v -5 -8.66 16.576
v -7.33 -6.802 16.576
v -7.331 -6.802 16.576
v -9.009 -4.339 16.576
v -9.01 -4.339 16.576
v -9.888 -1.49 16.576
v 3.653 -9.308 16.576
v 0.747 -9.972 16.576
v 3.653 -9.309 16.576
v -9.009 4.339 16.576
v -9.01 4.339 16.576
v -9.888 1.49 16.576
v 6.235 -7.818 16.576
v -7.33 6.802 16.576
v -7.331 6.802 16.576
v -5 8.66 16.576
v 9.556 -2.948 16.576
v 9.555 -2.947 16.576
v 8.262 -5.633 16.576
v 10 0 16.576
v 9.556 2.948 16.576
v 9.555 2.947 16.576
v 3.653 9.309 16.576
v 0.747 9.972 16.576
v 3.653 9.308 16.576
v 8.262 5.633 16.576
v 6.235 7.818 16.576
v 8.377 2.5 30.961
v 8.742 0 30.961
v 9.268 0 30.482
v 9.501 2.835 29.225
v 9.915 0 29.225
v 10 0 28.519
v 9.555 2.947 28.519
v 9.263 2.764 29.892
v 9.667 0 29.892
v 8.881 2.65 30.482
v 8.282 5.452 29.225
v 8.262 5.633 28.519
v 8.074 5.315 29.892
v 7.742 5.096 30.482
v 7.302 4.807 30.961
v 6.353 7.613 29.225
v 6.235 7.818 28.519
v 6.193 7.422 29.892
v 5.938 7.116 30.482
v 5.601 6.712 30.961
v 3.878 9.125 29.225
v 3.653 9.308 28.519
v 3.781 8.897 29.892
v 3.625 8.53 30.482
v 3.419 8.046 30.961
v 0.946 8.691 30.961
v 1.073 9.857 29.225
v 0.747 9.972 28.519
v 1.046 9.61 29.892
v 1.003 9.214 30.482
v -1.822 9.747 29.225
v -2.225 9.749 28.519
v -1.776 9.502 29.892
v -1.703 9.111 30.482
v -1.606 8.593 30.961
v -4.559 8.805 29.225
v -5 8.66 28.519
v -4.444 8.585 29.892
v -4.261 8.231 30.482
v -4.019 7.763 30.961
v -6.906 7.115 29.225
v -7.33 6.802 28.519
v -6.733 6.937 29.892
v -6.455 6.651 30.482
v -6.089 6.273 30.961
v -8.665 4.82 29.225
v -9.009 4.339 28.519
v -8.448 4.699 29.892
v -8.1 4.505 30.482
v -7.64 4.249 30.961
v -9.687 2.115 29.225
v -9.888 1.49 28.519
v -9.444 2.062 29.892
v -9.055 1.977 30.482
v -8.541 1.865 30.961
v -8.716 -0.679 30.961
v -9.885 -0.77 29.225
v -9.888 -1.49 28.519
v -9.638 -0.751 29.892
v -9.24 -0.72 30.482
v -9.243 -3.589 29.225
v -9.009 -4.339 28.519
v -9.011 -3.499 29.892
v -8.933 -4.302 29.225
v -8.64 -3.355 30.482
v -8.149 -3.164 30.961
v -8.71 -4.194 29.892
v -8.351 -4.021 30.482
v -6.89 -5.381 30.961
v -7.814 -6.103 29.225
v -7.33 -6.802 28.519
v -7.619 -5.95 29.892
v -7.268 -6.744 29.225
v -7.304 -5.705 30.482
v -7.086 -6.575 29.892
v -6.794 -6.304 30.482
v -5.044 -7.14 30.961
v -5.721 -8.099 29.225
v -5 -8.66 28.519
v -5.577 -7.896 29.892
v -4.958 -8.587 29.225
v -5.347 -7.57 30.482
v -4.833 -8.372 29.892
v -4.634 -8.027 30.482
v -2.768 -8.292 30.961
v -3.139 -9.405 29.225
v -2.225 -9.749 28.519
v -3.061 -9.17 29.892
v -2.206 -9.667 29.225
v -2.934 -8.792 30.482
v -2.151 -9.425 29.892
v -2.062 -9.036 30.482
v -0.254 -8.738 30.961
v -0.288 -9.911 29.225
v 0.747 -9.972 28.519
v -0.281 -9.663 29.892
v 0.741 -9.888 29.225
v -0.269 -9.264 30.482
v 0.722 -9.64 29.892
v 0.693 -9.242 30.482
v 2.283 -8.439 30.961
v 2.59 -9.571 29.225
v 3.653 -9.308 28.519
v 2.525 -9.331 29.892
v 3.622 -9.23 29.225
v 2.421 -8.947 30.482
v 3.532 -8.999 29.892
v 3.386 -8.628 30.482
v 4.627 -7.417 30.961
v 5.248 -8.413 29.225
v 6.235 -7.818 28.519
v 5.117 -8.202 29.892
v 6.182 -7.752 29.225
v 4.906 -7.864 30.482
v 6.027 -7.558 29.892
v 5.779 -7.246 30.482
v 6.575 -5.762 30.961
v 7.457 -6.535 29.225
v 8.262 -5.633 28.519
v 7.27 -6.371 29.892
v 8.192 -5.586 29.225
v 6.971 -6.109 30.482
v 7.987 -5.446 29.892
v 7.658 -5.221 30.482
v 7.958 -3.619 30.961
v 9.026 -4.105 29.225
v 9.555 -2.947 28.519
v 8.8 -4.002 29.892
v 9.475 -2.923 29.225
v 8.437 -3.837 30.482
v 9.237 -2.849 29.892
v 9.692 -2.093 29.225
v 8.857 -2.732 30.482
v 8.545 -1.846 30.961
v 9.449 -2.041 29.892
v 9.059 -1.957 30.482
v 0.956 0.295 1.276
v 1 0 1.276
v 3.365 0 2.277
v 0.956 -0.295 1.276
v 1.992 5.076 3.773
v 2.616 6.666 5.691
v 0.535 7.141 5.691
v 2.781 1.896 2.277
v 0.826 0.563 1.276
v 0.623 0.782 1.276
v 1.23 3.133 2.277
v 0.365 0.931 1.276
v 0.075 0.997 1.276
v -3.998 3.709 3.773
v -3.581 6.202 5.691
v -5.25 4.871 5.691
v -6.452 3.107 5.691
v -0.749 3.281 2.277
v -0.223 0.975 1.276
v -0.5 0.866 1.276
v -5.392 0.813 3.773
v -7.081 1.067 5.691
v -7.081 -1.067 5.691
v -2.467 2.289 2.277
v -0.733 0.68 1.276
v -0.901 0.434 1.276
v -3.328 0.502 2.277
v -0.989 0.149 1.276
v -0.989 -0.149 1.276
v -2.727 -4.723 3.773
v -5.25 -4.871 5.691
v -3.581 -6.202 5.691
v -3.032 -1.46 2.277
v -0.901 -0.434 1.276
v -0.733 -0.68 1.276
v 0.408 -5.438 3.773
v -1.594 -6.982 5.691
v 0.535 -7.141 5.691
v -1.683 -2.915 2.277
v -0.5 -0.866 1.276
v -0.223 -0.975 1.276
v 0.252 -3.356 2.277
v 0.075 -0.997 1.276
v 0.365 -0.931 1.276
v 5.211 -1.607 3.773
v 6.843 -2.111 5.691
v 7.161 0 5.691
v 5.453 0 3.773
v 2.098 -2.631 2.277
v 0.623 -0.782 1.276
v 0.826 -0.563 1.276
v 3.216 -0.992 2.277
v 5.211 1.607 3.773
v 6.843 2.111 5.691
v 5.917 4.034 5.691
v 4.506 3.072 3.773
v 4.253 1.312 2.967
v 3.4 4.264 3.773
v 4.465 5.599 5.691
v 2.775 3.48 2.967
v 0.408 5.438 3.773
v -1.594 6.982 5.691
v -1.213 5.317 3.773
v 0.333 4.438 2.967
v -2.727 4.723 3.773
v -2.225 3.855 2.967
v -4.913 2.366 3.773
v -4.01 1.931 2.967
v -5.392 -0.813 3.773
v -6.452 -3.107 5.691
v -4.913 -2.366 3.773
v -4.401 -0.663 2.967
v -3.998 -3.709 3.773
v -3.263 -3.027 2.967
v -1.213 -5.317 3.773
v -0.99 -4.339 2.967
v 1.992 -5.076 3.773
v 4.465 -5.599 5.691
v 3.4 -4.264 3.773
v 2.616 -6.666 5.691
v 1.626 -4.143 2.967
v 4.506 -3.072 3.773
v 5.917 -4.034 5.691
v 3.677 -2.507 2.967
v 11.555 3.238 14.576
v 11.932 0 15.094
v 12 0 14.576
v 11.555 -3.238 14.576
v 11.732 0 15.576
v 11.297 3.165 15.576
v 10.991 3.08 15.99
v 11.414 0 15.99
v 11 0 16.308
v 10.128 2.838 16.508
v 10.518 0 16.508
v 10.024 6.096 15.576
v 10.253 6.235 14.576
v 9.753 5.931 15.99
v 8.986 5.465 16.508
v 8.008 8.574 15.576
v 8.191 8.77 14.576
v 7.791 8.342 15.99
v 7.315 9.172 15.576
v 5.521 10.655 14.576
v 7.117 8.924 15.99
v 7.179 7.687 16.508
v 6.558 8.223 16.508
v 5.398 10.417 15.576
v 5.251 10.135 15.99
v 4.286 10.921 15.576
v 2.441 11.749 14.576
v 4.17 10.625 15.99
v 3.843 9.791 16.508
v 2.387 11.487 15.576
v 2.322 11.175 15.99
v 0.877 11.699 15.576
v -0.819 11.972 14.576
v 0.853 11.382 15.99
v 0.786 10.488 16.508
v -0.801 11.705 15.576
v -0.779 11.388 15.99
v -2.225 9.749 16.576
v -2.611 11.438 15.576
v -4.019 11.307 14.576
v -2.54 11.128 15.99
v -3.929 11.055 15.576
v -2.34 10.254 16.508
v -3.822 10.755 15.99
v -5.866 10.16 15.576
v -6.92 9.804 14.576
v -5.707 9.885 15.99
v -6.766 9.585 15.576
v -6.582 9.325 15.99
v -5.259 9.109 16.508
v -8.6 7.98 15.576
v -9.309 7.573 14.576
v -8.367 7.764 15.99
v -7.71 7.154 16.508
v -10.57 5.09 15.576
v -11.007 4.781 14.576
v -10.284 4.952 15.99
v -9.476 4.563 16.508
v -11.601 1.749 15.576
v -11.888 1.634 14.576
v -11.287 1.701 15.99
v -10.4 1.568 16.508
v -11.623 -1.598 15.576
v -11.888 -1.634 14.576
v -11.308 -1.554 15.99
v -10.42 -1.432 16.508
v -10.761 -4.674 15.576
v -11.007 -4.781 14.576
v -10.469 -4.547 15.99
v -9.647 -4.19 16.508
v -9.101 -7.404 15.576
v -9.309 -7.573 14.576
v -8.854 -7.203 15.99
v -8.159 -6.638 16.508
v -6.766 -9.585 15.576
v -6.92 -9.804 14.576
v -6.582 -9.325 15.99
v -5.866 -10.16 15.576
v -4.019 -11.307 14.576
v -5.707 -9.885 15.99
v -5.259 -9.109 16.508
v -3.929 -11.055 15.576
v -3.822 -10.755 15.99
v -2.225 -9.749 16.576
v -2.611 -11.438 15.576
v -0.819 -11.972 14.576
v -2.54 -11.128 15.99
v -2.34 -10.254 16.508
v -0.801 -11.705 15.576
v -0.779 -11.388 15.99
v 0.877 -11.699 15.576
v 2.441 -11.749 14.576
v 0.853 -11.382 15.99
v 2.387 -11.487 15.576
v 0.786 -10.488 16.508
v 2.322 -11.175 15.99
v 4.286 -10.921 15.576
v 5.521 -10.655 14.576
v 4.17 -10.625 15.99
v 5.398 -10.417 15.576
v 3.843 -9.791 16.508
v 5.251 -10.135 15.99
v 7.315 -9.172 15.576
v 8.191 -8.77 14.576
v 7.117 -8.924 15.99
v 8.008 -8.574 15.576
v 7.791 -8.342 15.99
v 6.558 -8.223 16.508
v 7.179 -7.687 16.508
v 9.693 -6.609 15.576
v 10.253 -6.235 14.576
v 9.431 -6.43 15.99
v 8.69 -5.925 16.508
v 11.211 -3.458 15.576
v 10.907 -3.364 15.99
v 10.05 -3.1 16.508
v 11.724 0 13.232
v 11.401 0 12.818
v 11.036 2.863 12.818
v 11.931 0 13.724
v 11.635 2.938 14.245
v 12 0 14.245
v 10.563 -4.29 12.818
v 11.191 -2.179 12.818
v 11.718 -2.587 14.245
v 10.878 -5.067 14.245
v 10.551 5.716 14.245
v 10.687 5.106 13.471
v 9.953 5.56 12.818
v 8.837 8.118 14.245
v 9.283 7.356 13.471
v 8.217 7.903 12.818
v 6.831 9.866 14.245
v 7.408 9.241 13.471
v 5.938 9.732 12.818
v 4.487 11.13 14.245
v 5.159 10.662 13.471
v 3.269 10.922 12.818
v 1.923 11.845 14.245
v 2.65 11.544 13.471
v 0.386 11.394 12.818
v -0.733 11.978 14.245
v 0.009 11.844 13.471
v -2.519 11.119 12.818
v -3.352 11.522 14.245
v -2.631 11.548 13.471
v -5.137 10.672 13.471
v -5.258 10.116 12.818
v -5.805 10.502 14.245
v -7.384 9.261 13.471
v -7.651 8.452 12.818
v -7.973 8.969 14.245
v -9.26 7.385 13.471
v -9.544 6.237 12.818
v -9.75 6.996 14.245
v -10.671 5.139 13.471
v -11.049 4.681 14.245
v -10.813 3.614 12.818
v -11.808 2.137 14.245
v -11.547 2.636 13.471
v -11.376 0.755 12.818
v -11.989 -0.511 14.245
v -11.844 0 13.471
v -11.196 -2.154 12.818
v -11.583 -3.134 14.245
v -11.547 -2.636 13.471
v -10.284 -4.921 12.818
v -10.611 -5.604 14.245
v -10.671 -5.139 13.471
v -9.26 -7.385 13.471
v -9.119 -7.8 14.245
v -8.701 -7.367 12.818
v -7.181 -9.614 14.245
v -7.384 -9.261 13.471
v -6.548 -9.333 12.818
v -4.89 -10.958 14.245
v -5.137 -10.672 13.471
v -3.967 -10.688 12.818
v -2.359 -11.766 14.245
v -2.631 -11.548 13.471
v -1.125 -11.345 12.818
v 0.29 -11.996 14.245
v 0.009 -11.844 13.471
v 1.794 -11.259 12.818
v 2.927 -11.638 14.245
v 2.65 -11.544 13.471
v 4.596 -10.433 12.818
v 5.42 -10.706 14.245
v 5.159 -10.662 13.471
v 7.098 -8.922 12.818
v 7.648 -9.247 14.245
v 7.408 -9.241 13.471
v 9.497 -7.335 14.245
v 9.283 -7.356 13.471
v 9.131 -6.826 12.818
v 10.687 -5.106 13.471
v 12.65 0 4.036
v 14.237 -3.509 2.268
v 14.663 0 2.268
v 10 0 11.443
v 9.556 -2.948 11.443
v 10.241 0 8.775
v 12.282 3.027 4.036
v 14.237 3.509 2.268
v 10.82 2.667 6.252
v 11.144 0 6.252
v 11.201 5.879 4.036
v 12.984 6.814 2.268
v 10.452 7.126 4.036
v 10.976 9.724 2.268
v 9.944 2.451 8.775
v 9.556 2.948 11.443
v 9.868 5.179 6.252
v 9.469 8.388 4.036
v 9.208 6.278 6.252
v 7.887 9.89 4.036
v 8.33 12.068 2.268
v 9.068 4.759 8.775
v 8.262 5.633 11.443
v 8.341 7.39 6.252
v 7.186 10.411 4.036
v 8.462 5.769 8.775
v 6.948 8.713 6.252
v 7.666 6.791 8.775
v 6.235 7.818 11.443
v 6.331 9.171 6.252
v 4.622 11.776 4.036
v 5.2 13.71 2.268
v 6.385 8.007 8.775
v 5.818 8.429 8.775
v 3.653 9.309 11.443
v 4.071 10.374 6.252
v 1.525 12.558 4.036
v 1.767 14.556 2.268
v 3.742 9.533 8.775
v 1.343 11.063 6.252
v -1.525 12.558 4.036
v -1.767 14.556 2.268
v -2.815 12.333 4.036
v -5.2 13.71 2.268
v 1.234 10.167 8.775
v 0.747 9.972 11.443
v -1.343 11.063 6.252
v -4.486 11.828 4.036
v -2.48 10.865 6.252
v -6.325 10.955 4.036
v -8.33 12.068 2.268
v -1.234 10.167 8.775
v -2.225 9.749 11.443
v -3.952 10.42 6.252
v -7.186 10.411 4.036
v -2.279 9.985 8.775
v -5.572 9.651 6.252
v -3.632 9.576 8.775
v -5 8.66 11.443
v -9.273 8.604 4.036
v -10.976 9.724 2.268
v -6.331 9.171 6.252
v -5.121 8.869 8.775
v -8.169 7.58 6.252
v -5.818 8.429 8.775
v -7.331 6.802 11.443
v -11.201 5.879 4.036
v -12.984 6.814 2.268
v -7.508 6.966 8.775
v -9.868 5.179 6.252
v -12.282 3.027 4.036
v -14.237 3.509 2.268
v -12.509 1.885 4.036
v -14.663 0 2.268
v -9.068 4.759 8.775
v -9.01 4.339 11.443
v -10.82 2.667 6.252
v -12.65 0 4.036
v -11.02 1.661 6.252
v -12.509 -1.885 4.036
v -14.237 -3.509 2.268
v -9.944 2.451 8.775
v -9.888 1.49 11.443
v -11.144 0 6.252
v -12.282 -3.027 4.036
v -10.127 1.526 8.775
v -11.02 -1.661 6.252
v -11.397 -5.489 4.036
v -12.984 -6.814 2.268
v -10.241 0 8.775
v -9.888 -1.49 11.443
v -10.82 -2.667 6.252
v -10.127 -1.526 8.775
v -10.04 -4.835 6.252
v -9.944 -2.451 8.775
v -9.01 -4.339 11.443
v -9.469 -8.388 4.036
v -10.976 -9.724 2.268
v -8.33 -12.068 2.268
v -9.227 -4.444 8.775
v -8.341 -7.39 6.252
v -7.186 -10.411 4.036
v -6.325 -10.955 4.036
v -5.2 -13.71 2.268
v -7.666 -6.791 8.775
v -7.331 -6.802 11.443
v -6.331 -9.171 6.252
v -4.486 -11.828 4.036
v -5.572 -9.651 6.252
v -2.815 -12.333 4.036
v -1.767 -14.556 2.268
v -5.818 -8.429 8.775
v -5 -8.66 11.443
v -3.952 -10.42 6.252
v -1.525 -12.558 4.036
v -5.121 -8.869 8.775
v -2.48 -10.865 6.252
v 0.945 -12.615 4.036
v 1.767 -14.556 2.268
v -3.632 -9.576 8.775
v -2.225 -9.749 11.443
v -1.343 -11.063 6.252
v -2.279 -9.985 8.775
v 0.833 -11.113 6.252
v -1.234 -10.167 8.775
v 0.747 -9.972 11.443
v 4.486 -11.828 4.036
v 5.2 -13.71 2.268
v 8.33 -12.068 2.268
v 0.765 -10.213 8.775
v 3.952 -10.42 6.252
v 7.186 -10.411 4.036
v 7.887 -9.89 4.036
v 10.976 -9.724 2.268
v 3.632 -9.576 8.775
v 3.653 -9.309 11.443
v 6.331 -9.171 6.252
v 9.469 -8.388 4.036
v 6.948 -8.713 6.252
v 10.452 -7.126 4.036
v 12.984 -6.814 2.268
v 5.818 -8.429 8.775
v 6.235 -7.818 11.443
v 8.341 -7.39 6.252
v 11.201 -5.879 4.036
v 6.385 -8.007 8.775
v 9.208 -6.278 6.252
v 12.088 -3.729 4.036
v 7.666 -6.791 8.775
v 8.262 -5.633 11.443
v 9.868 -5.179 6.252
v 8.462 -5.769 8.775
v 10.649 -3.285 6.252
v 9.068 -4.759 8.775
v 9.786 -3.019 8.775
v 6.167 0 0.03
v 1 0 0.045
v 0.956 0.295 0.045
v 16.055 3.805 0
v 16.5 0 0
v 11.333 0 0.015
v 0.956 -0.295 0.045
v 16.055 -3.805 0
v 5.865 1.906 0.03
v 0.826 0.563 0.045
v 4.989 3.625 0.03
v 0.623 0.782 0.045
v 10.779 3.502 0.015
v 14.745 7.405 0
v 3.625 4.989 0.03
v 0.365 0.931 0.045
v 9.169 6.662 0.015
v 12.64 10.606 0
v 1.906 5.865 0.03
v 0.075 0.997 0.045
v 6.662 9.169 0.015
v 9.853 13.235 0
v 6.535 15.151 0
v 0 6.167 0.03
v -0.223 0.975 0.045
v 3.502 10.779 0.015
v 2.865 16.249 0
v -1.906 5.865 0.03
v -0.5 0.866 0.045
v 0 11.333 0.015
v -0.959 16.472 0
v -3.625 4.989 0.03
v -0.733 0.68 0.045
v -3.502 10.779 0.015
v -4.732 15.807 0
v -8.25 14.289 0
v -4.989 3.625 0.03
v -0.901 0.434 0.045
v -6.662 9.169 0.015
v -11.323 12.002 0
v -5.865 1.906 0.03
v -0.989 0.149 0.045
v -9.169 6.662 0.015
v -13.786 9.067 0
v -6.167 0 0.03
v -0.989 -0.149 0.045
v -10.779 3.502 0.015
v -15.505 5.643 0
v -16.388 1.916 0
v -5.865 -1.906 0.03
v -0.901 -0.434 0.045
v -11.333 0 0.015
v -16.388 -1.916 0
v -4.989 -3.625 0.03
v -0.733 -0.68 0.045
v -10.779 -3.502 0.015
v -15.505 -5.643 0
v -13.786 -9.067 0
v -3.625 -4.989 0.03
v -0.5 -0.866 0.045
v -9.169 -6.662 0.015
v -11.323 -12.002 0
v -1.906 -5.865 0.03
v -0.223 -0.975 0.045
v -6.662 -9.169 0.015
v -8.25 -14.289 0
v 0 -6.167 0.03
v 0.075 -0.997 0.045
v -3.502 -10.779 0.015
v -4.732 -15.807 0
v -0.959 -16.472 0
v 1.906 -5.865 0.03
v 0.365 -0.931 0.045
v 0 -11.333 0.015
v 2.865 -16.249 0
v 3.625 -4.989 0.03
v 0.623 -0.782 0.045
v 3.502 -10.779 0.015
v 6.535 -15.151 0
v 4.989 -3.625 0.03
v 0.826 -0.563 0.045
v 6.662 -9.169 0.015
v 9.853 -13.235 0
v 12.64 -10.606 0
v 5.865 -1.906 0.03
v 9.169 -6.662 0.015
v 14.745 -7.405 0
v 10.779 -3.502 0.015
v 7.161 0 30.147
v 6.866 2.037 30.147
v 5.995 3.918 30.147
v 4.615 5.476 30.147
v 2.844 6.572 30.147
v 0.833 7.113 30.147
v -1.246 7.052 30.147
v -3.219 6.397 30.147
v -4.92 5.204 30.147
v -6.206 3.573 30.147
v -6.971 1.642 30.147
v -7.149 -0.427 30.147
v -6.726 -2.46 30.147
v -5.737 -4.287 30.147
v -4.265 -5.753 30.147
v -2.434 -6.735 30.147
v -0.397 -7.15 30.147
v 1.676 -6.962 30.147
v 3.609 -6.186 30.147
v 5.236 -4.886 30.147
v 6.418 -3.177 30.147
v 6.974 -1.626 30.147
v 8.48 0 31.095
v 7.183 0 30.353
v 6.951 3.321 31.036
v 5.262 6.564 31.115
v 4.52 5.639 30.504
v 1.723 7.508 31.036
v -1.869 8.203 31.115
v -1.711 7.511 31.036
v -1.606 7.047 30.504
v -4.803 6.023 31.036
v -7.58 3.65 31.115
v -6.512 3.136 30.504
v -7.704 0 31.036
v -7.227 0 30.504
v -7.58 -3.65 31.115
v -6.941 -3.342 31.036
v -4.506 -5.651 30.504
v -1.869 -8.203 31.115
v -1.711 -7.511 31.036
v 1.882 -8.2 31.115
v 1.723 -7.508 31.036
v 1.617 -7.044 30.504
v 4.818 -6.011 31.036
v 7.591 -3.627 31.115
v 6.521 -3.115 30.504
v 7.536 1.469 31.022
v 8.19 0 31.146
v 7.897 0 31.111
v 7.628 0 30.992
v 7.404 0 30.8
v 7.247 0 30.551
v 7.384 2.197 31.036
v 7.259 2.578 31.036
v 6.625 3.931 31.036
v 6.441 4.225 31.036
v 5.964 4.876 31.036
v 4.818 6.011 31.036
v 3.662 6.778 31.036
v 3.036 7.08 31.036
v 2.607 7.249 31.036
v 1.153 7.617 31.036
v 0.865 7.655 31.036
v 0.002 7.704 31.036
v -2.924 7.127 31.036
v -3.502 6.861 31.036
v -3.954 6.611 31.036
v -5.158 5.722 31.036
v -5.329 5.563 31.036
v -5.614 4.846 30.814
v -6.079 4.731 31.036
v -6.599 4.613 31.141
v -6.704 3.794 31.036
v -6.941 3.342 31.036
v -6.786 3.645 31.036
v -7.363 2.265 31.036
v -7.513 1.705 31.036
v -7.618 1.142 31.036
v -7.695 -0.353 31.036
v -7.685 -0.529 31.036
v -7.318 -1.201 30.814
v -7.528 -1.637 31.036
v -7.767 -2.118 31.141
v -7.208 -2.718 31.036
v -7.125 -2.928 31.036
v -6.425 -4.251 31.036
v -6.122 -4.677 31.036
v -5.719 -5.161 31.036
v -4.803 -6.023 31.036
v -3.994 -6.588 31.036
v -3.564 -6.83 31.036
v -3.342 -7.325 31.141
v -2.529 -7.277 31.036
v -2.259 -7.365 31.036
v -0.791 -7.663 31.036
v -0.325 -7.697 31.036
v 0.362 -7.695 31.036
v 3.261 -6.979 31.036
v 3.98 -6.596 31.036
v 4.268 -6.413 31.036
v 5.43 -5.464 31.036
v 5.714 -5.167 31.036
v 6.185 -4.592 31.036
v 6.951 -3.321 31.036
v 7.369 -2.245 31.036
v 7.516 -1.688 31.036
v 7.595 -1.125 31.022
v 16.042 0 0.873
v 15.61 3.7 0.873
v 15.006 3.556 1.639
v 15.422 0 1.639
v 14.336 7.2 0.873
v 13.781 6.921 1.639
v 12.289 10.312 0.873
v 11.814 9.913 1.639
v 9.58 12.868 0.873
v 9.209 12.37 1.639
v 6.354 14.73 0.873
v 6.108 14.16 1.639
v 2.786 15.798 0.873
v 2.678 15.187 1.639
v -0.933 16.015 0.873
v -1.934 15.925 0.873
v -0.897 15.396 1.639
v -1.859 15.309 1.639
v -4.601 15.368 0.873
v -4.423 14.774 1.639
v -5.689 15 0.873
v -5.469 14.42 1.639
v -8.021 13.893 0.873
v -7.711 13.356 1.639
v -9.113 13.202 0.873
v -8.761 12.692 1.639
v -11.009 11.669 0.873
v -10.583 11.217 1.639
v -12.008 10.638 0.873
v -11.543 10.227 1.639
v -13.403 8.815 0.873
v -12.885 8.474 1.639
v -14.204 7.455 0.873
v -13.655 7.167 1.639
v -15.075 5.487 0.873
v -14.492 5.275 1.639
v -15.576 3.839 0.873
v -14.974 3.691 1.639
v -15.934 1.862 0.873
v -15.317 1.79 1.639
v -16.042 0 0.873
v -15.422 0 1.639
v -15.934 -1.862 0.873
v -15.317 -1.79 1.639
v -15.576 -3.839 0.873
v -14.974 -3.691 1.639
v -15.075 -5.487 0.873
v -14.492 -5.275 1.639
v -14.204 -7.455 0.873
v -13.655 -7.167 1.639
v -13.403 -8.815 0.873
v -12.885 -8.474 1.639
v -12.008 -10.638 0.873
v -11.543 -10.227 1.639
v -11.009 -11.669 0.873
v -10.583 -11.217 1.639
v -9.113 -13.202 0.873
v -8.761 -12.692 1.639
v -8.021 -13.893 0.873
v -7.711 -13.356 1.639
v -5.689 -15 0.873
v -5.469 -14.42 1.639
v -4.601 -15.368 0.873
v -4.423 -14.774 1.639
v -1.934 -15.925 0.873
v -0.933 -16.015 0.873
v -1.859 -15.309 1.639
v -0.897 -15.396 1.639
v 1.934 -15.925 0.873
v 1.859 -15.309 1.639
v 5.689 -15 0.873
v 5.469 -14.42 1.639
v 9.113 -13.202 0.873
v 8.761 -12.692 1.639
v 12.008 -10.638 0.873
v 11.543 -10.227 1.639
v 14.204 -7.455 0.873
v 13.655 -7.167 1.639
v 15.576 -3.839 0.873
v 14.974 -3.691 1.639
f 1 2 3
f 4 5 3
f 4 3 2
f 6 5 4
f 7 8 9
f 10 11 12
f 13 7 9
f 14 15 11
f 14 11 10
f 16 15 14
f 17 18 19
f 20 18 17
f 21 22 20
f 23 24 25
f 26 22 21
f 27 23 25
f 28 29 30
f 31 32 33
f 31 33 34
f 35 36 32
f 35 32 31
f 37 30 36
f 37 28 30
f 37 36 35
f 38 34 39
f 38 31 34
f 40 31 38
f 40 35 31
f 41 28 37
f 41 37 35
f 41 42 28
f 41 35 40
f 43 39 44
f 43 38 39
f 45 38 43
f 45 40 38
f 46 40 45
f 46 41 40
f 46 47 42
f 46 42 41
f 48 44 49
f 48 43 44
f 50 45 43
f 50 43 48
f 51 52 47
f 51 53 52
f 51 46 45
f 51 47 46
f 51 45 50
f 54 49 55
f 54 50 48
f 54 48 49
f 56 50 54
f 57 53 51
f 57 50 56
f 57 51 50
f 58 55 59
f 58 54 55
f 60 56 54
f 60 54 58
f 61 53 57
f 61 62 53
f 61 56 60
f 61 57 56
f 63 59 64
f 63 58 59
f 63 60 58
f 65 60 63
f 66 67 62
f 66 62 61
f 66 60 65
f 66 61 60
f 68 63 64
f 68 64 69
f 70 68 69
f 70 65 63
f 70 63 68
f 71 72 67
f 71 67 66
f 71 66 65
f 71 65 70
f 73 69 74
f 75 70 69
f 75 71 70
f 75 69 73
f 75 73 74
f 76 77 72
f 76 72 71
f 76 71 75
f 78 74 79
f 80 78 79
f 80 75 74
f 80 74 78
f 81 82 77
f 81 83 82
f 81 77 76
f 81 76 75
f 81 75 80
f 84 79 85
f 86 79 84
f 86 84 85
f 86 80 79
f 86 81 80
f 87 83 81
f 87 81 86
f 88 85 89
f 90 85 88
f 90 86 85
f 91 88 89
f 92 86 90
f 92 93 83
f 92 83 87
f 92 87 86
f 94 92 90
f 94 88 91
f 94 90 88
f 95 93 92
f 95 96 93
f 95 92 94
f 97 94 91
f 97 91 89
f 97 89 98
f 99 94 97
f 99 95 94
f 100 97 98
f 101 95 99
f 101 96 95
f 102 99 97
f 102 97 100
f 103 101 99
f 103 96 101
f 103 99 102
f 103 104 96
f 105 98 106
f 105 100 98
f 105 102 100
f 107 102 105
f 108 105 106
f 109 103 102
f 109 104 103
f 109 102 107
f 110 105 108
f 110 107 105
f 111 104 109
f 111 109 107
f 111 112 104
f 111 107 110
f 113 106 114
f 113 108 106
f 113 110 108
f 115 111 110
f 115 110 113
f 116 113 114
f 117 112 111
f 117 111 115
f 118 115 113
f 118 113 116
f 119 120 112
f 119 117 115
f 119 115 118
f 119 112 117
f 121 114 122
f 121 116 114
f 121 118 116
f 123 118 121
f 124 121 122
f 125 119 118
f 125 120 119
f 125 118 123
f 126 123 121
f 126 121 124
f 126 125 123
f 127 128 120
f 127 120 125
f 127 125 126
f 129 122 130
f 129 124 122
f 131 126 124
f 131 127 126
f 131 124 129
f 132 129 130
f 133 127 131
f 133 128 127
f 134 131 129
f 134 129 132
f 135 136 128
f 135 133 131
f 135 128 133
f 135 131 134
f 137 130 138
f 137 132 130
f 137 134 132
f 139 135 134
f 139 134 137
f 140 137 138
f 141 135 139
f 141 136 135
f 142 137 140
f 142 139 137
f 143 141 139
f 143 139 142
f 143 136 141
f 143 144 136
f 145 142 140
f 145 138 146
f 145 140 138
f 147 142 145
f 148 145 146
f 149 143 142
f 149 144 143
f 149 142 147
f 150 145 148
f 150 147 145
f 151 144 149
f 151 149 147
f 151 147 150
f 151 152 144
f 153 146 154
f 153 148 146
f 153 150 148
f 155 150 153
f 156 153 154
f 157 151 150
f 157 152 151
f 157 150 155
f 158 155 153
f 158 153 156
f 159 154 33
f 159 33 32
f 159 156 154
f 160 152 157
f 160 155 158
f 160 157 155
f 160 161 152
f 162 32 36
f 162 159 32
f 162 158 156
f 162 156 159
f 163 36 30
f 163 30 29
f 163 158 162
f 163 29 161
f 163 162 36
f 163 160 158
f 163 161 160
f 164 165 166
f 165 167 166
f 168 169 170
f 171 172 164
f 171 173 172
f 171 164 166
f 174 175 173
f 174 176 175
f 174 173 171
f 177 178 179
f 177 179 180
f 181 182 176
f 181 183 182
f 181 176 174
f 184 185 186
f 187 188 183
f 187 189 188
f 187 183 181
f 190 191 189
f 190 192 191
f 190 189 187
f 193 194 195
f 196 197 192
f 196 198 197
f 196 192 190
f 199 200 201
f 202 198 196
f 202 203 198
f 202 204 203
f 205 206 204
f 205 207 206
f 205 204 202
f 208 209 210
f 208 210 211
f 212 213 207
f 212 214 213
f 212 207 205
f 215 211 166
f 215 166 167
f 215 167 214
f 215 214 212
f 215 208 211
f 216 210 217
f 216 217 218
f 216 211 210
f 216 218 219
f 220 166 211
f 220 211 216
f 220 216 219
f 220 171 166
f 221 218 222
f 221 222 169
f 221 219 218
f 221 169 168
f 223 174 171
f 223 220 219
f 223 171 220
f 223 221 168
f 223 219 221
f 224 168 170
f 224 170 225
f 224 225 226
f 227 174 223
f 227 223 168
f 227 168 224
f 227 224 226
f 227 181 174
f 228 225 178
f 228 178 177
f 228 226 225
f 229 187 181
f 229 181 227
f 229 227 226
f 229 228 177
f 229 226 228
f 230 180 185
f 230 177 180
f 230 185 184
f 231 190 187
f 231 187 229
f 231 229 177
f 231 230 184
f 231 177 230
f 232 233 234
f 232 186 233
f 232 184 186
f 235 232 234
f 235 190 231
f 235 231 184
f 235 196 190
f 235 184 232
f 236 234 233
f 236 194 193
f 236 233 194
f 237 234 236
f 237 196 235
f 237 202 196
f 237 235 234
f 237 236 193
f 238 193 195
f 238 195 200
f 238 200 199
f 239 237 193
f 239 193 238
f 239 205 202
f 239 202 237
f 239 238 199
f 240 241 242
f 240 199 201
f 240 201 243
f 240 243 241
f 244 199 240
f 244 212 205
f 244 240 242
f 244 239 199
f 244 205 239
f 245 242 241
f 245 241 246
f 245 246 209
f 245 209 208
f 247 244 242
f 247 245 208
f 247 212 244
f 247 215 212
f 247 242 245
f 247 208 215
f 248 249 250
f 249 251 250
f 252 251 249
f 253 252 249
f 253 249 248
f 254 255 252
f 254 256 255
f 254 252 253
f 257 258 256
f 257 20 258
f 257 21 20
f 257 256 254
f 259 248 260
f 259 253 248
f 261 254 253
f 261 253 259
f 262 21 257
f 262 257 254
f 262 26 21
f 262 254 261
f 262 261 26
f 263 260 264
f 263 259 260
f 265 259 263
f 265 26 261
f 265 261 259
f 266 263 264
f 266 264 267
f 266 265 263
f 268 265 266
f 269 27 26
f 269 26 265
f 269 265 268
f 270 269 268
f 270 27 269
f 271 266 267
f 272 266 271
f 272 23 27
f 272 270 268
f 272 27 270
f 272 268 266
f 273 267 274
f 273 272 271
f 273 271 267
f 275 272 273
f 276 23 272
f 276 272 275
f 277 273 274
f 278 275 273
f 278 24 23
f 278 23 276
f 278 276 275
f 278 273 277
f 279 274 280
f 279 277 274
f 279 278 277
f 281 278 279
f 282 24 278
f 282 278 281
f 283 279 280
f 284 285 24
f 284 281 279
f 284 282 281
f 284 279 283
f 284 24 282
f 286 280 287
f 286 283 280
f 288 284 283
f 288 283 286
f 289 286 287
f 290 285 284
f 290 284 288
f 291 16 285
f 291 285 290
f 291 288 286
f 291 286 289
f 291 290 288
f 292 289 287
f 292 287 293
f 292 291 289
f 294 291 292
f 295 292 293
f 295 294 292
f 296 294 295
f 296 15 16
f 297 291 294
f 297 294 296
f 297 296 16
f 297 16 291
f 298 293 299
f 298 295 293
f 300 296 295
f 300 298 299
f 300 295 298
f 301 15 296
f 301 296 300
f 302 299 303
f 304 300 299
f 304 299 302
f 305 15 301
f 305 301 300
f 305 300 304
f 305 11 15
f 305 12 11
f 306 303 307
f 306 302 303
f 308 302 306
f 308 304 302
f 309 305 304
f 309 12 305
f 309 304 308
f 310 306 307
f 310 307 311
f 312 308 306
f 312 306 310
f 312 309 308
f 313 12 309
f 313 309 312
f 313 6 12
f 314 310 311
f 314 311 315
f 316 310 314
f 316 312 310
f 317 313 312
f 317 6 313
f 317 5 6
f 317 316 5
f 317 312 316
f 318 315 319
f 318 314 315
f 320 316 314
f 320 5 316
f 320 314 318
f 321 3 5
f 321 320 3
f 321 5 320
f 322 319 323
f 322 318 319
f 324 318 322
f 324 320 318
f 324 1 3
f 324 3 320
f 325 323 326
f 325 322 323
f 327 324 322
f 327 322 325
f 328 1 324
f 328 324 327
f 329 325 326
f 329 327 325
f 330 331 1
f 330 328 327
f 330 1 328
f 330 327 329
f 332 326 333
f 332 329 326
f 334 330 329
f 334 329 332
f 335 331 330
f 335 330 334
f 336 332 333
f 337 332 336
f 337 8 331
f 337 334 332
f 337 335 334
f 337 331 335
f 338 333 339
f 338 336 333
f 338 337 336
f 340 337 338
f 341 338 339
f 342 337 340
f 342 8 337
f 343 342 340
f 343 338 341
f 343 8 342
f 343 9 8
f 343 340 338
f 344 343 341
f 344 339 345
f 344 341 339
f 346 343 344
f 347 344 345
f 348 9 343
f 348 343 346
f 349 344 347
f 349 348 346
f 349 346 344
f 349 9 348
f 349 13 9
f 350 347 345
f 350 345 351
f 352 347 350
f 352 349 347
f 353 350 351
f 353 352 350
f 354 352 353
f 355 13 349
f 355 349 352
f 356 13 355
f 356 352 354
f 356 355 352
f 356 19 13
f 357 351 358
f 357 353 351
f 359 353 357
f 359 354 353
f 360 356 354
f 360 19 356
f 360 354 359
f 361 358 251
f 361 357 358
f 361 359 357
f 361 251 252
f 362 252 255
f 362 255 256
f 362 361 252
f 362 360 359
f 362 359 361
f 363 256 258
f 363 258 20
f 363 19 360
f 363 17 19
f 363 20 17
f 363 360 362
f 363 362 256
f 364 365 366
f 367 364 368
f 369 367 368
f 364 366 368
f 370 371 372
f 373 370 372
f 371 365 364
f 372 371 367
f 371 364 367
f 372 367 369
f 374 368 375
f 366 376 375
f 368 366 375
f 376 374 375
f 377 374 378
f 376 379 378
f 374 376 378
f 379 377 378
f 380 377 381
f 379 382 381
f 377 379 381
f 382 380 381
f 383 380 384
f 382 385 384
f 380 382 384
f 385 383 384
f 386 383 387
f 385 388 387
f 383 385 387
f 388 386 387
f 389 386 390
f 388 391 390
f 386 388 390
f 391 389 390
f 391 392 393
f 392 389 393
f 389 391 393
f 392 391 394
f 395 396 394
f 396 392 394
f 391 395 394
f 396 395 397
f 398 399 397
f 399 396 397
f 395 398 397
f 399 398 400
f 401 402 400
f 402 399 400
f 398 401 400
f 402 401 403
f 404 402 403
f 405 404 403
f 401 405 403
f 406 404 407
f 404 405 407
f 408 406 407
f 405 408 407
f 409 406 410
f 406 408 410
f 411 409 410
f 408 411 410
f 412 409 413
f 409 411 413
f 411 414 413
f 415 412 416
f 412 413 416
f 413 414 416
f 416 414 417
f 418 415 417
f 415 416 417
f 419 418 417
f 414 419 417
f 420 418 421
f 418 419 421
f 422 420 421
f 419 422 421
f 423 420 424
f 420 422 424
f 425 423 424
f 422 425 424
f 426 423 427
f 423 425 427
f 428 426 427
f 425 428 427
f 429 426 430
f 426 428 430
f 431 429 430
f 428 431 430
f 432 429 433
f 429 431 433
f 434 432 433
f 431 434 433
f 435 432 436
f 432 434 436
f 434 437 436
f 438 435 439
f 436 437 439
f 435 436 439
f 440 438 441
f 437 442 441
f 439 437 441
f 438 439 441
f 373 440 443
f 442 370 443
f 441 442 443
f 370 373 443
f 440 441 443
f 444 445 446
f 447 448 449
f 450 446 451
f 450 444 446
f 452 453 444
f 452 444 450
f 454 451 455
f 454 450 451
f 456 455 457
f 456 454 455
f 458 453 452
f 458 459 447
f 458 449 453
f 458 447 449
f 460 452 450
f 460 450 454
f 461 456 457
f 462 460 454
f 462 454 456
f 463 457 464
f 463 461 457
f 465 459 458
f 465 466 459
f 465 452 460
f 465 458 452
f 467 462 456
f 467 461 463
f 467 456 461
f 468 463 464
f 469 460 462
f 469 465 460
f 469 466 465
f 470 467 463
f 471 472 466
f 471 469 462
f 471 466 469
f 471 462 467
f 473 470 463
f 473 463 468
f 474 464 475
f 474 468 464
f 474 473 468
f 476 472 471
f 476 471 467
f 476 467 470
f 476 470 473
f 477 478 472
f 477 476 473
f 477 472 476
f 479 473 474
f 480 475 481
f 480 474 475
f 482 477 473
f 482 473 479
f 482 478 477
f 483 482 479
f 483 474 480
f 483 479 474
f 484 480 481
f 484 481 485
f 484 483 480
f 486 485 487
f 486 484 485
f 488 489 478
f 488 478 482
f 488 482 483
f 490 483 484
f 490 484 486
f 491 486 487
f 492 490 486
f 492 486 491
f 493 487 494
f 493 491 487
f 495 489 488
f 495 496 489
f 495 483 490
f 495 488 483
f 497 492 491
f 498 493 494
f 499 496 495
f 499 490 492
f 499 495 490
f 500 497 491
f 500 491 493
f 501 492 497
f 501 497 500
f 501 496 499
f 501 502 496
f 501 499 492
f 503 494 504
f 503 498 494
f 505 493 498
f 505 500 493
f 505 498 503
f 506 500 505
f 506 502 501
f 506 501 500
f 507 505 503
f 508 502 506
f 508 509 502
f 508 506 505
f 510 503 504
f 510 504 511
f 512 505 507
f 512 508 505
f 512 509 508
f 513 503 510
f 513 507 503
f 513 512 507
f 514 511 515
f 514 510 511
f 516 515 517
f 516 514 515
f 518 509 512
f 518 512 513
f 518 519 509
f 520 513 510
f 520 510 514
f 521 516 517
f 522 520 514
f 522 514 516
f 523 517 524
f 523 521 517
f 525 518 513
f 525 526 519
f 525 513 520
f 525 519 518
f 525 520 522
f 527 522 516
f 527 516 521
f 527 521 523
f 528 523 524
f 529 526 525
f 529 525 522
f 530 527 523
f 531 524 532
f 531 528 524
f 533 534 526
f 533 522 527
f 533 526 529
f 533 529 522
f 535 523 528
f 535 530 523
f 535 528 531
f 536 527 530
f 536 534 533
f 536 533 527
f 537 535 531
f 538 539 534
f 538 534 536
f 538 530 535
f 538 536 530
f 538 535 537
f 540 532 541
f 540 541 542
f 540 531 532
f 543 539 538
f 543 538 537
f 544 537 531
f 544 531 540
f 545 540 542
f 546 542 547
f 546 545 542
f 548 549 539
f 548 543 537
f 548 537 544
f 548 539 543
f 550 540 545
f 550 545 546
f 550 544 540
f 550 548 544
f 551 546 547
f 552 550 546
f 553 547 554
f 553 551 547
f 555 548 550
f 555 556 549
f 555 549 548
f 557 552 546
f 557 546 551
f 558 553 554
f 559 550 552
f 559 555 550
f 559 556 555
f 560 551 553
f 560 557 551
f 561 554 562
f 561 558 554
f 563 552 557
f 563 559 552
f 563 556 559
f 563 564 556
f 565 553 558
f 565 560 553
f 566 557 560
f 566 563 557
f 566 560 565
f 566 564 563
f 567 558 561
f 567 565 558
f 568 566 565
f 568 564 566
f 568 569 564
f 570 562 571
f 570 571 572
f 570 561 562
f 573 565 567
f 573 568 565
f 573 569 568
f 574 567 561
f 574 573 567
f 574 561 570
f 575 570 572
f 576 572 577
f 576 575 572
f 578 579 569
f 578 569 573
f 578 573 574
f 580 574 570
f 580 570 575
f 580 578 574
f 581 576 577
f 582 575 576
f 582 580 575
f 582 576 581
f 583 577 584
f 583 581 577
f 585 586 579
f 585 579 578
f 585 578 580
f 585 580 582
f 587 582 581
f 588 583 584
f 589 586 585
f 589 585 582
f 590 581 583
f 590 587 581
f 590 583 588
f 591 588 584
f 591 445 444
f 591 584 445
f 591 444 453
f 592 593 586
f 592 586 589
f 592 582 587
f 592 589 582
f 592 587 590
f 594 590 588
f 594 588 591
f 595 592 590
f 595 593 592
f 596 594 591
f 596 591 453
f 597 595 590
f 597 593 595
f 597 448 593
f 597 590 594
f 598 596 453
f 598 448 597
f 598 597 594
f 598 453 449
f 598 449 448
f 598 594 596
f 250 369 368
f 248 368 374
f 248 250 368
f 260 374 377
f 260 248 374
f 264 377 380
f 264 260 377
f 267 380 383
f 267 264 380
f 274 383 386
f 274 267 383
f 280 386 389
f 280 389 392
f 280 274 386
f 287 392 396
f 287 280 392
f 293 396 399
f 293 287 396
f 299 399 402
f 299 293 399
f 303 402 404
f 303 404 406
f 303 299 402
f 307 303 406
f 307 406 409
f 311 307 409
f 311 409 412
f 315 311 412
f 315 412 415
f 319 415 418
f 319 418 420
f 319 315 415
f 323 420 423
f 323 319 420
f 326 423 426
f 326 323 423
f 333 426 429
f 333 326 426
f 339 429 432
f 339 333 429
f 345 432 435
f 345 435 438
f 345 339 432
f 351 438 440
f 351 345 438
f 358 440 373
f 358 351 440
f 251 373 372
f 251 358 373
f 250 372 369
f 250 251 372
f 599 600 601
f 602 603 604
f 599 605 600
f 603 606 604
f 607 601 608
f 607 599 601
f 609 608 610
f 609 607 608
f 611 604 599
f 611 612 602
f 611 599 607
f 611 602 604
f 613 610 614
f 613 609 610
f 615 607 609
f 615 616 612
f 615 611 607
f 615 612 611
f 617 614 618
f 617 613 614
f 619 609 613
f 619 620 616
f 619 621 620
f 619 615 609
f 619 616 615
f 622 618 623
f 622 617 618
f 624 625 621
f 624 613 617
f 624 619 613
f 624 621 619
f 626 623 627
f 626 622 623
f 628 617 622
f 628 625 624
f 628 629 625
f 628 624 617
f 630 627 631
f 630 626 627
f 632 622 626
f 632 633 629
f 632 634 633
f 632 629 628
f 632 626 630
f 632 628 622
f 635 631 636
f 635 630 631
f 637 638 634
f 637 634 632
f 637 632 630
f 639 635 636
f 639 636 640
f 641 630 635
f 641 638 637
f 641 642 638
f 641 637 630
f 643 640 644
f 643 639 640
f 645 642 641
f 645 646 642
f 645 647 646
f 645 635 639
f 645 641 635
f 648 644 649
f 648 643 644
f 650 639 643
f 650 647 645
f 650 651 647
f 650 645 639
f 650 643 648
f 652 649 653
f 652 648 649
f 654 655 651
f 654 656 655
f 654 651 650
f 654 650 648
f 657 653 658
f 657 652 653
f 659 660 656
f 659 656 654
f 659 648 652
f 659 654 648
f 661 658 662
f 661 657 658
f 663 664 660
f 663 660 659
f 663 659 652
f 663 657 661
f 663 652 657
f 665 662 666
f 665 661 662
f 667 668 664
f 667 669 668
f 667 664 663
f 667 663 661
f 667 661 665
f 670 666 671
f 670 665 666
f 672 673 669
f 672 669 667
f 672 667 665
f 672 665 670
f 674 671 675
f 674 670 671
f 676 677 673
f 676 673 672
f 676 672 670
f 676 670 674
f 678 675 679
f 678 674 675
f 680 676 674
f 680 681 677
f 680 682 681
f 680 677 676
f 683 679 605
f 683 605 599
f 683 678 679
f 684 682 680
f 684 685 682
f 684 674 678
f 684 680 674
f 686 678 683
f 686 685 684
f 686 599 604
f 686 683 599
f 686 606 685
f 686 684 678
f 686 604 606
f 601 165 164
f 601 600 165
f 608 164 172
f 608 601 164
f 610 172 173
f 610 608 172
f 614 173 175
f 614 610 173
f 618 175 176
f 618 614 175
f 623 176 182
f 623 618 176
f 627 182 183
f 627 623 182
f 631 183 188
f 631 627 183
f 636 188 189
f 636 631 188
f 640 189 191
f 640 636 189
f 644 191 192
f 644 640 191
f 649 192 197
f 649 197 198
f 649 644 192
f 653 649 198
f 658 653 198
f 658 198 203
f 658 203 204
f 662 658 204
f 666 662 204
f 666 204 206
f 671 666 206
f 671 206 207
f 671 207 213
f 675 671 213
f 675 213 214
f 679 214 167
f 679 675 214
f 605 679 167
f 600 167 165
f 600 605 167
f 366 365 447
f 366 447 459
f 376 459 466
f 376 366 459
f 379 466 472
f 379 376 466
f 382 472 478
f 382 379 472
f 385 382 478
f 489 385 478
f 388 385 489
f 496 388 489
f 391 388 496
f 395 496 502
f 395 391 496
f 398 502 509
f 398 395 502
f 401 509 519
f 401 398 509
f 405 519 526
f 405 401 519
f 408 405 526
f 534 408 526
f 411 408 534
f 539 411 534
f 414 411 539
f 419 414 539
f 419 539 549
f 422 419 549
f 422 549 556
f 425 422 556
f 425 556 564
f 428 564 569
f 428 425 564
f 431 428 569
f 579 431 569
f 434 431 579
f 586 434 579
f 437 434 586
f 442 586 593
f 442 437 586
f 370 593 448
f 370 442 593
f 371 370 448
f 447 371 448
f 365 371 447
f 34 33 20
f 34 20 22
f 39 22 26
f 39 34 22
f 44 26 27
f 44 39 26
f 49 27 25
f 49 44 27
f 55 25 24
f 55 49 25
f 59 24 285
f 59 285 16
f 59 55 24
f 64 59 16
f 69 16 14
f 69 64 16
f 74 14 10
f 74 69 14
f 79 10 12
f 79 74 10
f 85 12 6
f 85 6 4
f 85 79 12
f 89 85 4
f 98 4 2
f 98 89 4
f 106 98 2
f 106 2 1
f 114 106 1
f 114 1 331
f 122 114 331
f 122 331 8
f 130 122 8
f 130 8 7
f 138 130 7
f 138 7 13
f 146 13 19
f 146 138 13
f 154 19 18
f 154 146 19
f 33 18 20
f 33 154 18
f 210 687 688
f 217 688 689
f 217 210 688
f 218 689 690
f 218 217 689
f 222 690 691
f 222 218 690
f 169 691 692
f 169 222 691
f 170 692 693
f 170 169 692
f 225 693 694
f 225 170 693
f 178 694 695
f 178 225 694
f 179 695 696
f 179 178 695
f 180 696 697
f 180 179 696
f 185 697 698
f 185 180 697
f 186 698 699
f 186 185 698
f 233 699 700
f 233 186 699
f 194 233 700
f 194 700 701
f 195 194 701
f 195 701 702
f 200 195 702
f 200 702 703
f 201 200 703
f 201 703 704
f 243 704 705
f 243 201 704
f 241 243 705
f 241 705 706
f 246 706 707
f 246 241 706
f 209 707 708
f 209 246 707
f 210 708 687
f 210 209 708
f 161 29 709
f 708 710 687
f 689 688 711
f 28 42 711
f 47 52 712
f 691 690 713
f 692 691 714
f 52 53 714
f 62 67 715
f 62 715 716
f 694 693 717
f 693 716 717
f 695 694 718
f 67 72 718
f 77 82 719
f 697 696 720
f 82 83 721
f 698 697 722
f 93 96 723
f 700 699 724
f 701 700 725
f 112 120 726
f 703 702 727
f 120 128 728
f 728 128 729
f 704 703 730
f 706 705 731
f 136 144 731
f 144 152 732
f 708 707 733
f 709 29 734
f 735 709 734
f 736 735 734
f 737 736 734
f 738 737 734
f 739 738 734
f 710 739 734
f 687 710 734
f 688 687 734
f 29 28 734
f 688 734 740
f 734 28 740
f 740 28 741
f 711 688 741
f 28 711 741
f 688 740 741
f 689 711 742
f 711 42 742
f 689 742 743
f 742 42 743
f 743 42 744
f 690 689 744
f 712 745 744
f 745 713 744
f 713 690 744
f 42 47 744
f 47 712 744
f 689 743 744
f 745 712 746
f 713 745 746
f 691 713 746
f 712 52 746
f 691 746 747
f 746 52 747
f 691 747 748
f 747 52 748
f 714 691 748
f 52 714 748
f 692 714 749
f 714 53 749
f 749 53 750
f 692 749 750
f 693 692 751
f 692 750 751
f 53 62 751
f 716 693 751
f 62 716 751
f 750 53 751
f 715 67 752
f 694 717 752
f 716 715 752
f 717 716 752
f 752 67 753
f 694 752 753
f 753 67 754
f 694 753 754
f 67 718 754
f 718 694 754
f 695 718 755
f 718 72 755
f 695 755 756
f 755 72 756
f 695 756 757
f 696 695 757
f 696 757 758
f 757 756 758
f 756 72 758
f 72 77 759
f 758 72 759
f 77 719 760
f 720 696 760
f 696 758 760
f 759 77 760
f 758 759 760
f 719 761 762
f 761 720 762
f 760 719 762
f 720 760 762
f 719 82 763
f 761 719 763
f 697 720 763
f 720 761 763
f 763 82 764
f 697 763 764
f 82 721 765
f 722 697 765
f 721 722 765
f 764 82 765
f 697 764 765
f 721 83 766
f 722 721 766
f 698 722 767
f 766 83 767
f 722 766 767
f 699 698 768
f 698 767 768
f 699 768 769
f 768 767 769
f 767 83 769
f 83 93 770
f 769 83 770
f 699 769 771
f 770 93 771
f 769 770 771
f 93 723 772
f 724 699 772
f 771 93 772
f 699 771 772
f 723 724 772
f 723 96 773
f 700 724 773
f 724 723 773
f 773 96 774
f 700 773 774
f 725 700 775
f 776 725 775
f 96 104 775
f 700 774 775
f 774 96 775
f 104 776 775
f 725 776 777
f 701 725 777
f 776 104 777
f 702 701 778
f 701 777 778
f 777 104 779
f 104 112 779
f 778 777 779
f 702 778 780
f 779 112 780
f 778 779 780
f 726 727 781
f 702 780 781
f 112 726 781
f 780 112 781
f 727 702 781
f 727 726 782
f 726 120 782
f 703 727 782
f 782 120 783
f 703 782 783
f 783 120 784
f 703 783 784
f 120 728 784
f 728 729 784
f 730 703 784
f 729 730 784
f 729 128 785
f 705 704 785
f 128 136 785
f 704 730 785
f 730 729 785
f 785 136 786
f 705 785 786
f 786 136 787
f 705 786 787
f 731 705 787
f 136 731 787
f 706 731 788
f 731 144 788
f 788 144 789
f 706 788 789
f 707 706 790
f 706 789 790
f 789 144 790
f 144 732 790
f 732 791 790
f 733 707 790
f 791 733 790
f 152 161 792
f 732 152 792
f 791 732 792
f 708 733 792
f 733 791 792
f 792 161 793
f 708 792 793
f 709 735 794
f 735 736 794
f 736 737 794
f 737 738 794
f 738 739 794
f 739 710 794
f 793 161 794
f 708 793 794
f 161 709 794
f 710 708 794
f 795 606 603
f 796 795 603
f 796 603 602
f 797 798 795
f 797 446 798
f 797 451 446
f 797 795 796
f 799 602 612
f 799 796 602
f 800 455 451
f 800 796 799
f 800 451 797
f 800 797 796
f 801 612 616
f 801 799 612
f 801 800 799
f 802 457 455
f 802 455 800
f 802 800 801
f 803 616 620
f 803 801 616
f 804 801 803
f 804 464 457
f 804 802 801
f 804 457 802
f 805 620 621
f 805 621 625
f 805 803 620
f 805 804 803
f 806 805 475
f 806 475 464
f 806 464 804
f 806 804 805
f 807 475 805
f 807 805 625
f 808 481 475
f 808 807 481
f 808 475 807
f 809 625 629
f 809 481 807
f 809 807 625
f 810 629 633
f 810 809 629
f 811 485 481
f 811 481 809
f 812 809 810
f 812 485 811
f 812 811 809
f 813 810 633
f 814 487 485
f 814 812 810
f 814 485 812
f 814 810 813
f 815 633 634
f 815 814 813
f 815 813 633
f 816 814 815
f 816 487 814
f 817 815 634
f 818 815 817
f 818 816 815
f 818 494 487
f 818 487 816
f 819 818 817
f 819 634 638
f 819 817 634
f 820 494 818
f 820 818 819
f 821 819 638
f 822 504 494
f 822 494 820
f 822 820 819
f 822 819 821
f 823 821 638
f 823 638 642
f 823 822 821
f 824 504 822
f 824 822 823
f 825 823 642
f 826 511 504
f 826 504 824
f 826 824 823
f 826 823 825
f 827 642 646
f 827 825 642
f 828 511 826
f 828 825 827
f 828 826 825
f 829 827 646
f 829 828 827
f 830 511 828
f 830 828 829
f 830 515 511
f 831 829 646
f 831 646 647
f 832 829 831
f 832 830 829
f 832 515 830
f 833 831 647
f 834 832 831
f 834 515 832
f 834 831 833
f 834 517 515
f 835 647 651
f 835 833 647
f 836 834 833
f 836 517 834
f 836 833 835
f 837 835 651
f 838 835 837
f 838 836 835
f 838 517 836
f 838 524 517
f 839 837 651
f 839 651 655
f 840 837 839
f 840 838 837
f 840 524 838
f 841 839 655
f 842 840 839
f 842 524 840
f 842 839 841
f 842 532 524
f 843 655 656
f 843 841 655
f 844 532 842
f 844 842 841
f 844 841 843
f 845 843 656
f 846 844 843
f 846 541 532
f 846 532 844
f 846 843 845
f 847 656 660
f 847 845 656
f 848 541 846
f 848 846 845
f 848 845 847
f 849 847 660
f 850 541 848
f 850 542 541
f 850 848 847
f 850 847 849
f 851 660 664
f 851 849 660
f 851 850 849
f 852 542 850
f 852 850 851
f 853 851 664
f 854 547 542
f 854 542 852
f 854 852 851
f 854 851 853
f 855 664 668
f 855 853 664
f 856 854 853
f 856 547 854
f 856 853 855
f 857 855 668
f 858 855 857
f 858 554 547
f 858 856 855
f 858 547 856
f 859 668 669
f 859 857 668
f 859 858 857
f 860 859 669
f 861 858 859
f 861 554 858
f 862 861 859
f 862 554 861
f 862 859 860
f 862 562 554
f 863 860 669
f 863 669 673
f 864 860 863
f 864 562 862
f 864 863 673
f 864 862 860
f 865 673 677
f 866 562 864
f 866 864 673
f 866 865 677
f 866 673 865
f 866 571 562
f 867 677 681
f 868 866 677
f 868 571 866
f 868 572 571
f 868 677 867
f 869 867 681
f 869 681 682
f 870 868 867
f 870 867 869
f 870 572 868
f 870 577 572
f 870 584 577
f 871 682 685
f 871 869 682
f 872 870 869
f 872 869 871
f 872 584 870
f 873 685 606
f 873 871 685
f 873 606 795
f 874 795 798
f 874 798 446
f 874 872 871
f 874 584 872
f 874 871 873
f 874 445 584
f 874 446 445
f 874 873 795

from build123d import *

# Parameters (mm, degrees)
F3_R = 2
F4_R = 2
F6_R = 1


# Not quite as in the source:
# - a fillet or chamfer that OpenCascade refuses, or shapes differently, is made with other operations: its cross-section is extruded or revolved along the edge and cut away or added


with BuildPart() as f1:
    # F0 (on Front) → F1 (revolve)
    with BuildSketch(Plane.XZ):
        with BuildLine():
            ThreePointArc((16.5, 1.2755964417), (11.6628201448, 5.344639677), (10, 11.4430370868))
            Line((10, 11.4430370868), (12, 13.4055894333))
            Line((12, 13.4055894333), (12, 16.5758651609))
            Line((12, 16.5758651609), (9.9997436628, 16.5758651609))
            Line((9.9997436628, 16.5758651609), (9.9997436628, 31.5143950284))
            Line((9.9997436628, 31.5143950284), (7.1613686159, 31.5143950284))
            Line((7.1613686159, 31.5143950284), (7.1613686159, 5.6914240122))
            ThreePointArc((7.1613686159, 5.6914240122), (4.4508587391, 2.967008827), (1, 1.2755964417))
            Line((1, 1.2755964417), (1, 0.0454979338))
            Line((1, 0.0454979338), (16.5, 0))
            Line((16.5, 0), (16.5, 1.2755964417))
        make_face()
    revolve(axis=Axis((0, 0, 19.1986504942), (0, 0, 1)))

    # F2: fillet of radius 5 on 1 edges, made by hand

    # F2_s1 → F2_t2 (revolve, cut)
    with BuildSketch(Plane.XZ):
        with BuildLine():
            ThreePointArc((16.5, 0), (15.750789479, 1.2709297875), (14.6632904097, 2.2678875116))
            ThreePointArc((14.6632904097, 2.2678875116), (15.557168946, 1.7264369439), (16.5, 1.2755964417))
            Line((16.5, 1.2755964417), (16.5, 0))
        make_face()
    revolve(axis=Axis((0, 0, 1.2755964417), (0, 0, 1)), mode=Mode.SUBTRACT)

    # F3
    f3_edges = [f1.edges().sort_by_distance(p)[0] for p in [
        (-12, 0, 13.405589),
    ]]
    fillet(f3_edges, radius=F3_R)

    # F4
    f4_edges = [f1.edges().sort_by_distance(p)[0] for p in [
        (-12, 0, 16.575865),
    ]]
    fillet(f4_edges, radius=F4_R)

    # F5: fillet of radius 3 on 1 edges, made by hand

    # F5_s1 → F5_t2 (revolve, cut)
    with BuildSketch(Plane.XZ):
        with BuildLine():
            ThreePointArc((9.9997436628, 28.5187519631), (9.1774574708, 30.5821381534), (7.1613686159, 31.5143950284))
            Line((7.1613686159, 31.5143950284), (9.9997436628, 31.5143950284))
            Line((9.9997436628, 31.5143950284), (9.9997436628, 28.5187519631))
        make_face()
    revolve(axis=Axis((0, 0, 31.5143950284), (0, 0, 1)), mode=Mode.SUBTRACT)

    # F6
    f6_edges = [f1.edges().sort_by_distance(p)[0] for p in [
        (-7.161369, 0, 31.514395),
    ]]
    fillet(f6_edges, radius=F6_R)


solid = f1.part
